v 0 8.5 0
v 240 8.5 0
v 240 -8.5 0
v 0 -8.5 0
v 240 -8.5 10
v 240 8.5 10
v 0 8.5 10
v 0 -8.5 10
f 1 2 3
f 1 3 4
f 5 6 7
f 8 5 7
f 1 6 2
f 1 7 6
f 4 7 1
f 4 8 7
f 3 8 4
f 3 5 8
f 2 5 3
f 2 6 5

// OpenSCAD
// Units: mm. Beam-model study only; physical/manufacturing validation pending.
linear_extrude(height=10)
polygon(points=[[0,-8.5],[20.0,-8.5],[40.0,-8.5],[60.0,-8.5],[80.0,-8.5],[100.0,-8.5],[120.0,-8.5],[140.0,-8.5],[160.0,-8.5],[180.0,-8.5],[200.0,-8.5],[220.0,-8.5],[240.0,-8.5],[240,8.5],[220.0,8.5],[200.0,8.5],[180.0,8.5],[160.0,8.5],[140.0,8.5],[120.0,8.5],[100.0,8.5],[80.0,8.5],[60.0,8.5],[40.0,8.5],[20.0,8.5],[0.0,8.5]]);
